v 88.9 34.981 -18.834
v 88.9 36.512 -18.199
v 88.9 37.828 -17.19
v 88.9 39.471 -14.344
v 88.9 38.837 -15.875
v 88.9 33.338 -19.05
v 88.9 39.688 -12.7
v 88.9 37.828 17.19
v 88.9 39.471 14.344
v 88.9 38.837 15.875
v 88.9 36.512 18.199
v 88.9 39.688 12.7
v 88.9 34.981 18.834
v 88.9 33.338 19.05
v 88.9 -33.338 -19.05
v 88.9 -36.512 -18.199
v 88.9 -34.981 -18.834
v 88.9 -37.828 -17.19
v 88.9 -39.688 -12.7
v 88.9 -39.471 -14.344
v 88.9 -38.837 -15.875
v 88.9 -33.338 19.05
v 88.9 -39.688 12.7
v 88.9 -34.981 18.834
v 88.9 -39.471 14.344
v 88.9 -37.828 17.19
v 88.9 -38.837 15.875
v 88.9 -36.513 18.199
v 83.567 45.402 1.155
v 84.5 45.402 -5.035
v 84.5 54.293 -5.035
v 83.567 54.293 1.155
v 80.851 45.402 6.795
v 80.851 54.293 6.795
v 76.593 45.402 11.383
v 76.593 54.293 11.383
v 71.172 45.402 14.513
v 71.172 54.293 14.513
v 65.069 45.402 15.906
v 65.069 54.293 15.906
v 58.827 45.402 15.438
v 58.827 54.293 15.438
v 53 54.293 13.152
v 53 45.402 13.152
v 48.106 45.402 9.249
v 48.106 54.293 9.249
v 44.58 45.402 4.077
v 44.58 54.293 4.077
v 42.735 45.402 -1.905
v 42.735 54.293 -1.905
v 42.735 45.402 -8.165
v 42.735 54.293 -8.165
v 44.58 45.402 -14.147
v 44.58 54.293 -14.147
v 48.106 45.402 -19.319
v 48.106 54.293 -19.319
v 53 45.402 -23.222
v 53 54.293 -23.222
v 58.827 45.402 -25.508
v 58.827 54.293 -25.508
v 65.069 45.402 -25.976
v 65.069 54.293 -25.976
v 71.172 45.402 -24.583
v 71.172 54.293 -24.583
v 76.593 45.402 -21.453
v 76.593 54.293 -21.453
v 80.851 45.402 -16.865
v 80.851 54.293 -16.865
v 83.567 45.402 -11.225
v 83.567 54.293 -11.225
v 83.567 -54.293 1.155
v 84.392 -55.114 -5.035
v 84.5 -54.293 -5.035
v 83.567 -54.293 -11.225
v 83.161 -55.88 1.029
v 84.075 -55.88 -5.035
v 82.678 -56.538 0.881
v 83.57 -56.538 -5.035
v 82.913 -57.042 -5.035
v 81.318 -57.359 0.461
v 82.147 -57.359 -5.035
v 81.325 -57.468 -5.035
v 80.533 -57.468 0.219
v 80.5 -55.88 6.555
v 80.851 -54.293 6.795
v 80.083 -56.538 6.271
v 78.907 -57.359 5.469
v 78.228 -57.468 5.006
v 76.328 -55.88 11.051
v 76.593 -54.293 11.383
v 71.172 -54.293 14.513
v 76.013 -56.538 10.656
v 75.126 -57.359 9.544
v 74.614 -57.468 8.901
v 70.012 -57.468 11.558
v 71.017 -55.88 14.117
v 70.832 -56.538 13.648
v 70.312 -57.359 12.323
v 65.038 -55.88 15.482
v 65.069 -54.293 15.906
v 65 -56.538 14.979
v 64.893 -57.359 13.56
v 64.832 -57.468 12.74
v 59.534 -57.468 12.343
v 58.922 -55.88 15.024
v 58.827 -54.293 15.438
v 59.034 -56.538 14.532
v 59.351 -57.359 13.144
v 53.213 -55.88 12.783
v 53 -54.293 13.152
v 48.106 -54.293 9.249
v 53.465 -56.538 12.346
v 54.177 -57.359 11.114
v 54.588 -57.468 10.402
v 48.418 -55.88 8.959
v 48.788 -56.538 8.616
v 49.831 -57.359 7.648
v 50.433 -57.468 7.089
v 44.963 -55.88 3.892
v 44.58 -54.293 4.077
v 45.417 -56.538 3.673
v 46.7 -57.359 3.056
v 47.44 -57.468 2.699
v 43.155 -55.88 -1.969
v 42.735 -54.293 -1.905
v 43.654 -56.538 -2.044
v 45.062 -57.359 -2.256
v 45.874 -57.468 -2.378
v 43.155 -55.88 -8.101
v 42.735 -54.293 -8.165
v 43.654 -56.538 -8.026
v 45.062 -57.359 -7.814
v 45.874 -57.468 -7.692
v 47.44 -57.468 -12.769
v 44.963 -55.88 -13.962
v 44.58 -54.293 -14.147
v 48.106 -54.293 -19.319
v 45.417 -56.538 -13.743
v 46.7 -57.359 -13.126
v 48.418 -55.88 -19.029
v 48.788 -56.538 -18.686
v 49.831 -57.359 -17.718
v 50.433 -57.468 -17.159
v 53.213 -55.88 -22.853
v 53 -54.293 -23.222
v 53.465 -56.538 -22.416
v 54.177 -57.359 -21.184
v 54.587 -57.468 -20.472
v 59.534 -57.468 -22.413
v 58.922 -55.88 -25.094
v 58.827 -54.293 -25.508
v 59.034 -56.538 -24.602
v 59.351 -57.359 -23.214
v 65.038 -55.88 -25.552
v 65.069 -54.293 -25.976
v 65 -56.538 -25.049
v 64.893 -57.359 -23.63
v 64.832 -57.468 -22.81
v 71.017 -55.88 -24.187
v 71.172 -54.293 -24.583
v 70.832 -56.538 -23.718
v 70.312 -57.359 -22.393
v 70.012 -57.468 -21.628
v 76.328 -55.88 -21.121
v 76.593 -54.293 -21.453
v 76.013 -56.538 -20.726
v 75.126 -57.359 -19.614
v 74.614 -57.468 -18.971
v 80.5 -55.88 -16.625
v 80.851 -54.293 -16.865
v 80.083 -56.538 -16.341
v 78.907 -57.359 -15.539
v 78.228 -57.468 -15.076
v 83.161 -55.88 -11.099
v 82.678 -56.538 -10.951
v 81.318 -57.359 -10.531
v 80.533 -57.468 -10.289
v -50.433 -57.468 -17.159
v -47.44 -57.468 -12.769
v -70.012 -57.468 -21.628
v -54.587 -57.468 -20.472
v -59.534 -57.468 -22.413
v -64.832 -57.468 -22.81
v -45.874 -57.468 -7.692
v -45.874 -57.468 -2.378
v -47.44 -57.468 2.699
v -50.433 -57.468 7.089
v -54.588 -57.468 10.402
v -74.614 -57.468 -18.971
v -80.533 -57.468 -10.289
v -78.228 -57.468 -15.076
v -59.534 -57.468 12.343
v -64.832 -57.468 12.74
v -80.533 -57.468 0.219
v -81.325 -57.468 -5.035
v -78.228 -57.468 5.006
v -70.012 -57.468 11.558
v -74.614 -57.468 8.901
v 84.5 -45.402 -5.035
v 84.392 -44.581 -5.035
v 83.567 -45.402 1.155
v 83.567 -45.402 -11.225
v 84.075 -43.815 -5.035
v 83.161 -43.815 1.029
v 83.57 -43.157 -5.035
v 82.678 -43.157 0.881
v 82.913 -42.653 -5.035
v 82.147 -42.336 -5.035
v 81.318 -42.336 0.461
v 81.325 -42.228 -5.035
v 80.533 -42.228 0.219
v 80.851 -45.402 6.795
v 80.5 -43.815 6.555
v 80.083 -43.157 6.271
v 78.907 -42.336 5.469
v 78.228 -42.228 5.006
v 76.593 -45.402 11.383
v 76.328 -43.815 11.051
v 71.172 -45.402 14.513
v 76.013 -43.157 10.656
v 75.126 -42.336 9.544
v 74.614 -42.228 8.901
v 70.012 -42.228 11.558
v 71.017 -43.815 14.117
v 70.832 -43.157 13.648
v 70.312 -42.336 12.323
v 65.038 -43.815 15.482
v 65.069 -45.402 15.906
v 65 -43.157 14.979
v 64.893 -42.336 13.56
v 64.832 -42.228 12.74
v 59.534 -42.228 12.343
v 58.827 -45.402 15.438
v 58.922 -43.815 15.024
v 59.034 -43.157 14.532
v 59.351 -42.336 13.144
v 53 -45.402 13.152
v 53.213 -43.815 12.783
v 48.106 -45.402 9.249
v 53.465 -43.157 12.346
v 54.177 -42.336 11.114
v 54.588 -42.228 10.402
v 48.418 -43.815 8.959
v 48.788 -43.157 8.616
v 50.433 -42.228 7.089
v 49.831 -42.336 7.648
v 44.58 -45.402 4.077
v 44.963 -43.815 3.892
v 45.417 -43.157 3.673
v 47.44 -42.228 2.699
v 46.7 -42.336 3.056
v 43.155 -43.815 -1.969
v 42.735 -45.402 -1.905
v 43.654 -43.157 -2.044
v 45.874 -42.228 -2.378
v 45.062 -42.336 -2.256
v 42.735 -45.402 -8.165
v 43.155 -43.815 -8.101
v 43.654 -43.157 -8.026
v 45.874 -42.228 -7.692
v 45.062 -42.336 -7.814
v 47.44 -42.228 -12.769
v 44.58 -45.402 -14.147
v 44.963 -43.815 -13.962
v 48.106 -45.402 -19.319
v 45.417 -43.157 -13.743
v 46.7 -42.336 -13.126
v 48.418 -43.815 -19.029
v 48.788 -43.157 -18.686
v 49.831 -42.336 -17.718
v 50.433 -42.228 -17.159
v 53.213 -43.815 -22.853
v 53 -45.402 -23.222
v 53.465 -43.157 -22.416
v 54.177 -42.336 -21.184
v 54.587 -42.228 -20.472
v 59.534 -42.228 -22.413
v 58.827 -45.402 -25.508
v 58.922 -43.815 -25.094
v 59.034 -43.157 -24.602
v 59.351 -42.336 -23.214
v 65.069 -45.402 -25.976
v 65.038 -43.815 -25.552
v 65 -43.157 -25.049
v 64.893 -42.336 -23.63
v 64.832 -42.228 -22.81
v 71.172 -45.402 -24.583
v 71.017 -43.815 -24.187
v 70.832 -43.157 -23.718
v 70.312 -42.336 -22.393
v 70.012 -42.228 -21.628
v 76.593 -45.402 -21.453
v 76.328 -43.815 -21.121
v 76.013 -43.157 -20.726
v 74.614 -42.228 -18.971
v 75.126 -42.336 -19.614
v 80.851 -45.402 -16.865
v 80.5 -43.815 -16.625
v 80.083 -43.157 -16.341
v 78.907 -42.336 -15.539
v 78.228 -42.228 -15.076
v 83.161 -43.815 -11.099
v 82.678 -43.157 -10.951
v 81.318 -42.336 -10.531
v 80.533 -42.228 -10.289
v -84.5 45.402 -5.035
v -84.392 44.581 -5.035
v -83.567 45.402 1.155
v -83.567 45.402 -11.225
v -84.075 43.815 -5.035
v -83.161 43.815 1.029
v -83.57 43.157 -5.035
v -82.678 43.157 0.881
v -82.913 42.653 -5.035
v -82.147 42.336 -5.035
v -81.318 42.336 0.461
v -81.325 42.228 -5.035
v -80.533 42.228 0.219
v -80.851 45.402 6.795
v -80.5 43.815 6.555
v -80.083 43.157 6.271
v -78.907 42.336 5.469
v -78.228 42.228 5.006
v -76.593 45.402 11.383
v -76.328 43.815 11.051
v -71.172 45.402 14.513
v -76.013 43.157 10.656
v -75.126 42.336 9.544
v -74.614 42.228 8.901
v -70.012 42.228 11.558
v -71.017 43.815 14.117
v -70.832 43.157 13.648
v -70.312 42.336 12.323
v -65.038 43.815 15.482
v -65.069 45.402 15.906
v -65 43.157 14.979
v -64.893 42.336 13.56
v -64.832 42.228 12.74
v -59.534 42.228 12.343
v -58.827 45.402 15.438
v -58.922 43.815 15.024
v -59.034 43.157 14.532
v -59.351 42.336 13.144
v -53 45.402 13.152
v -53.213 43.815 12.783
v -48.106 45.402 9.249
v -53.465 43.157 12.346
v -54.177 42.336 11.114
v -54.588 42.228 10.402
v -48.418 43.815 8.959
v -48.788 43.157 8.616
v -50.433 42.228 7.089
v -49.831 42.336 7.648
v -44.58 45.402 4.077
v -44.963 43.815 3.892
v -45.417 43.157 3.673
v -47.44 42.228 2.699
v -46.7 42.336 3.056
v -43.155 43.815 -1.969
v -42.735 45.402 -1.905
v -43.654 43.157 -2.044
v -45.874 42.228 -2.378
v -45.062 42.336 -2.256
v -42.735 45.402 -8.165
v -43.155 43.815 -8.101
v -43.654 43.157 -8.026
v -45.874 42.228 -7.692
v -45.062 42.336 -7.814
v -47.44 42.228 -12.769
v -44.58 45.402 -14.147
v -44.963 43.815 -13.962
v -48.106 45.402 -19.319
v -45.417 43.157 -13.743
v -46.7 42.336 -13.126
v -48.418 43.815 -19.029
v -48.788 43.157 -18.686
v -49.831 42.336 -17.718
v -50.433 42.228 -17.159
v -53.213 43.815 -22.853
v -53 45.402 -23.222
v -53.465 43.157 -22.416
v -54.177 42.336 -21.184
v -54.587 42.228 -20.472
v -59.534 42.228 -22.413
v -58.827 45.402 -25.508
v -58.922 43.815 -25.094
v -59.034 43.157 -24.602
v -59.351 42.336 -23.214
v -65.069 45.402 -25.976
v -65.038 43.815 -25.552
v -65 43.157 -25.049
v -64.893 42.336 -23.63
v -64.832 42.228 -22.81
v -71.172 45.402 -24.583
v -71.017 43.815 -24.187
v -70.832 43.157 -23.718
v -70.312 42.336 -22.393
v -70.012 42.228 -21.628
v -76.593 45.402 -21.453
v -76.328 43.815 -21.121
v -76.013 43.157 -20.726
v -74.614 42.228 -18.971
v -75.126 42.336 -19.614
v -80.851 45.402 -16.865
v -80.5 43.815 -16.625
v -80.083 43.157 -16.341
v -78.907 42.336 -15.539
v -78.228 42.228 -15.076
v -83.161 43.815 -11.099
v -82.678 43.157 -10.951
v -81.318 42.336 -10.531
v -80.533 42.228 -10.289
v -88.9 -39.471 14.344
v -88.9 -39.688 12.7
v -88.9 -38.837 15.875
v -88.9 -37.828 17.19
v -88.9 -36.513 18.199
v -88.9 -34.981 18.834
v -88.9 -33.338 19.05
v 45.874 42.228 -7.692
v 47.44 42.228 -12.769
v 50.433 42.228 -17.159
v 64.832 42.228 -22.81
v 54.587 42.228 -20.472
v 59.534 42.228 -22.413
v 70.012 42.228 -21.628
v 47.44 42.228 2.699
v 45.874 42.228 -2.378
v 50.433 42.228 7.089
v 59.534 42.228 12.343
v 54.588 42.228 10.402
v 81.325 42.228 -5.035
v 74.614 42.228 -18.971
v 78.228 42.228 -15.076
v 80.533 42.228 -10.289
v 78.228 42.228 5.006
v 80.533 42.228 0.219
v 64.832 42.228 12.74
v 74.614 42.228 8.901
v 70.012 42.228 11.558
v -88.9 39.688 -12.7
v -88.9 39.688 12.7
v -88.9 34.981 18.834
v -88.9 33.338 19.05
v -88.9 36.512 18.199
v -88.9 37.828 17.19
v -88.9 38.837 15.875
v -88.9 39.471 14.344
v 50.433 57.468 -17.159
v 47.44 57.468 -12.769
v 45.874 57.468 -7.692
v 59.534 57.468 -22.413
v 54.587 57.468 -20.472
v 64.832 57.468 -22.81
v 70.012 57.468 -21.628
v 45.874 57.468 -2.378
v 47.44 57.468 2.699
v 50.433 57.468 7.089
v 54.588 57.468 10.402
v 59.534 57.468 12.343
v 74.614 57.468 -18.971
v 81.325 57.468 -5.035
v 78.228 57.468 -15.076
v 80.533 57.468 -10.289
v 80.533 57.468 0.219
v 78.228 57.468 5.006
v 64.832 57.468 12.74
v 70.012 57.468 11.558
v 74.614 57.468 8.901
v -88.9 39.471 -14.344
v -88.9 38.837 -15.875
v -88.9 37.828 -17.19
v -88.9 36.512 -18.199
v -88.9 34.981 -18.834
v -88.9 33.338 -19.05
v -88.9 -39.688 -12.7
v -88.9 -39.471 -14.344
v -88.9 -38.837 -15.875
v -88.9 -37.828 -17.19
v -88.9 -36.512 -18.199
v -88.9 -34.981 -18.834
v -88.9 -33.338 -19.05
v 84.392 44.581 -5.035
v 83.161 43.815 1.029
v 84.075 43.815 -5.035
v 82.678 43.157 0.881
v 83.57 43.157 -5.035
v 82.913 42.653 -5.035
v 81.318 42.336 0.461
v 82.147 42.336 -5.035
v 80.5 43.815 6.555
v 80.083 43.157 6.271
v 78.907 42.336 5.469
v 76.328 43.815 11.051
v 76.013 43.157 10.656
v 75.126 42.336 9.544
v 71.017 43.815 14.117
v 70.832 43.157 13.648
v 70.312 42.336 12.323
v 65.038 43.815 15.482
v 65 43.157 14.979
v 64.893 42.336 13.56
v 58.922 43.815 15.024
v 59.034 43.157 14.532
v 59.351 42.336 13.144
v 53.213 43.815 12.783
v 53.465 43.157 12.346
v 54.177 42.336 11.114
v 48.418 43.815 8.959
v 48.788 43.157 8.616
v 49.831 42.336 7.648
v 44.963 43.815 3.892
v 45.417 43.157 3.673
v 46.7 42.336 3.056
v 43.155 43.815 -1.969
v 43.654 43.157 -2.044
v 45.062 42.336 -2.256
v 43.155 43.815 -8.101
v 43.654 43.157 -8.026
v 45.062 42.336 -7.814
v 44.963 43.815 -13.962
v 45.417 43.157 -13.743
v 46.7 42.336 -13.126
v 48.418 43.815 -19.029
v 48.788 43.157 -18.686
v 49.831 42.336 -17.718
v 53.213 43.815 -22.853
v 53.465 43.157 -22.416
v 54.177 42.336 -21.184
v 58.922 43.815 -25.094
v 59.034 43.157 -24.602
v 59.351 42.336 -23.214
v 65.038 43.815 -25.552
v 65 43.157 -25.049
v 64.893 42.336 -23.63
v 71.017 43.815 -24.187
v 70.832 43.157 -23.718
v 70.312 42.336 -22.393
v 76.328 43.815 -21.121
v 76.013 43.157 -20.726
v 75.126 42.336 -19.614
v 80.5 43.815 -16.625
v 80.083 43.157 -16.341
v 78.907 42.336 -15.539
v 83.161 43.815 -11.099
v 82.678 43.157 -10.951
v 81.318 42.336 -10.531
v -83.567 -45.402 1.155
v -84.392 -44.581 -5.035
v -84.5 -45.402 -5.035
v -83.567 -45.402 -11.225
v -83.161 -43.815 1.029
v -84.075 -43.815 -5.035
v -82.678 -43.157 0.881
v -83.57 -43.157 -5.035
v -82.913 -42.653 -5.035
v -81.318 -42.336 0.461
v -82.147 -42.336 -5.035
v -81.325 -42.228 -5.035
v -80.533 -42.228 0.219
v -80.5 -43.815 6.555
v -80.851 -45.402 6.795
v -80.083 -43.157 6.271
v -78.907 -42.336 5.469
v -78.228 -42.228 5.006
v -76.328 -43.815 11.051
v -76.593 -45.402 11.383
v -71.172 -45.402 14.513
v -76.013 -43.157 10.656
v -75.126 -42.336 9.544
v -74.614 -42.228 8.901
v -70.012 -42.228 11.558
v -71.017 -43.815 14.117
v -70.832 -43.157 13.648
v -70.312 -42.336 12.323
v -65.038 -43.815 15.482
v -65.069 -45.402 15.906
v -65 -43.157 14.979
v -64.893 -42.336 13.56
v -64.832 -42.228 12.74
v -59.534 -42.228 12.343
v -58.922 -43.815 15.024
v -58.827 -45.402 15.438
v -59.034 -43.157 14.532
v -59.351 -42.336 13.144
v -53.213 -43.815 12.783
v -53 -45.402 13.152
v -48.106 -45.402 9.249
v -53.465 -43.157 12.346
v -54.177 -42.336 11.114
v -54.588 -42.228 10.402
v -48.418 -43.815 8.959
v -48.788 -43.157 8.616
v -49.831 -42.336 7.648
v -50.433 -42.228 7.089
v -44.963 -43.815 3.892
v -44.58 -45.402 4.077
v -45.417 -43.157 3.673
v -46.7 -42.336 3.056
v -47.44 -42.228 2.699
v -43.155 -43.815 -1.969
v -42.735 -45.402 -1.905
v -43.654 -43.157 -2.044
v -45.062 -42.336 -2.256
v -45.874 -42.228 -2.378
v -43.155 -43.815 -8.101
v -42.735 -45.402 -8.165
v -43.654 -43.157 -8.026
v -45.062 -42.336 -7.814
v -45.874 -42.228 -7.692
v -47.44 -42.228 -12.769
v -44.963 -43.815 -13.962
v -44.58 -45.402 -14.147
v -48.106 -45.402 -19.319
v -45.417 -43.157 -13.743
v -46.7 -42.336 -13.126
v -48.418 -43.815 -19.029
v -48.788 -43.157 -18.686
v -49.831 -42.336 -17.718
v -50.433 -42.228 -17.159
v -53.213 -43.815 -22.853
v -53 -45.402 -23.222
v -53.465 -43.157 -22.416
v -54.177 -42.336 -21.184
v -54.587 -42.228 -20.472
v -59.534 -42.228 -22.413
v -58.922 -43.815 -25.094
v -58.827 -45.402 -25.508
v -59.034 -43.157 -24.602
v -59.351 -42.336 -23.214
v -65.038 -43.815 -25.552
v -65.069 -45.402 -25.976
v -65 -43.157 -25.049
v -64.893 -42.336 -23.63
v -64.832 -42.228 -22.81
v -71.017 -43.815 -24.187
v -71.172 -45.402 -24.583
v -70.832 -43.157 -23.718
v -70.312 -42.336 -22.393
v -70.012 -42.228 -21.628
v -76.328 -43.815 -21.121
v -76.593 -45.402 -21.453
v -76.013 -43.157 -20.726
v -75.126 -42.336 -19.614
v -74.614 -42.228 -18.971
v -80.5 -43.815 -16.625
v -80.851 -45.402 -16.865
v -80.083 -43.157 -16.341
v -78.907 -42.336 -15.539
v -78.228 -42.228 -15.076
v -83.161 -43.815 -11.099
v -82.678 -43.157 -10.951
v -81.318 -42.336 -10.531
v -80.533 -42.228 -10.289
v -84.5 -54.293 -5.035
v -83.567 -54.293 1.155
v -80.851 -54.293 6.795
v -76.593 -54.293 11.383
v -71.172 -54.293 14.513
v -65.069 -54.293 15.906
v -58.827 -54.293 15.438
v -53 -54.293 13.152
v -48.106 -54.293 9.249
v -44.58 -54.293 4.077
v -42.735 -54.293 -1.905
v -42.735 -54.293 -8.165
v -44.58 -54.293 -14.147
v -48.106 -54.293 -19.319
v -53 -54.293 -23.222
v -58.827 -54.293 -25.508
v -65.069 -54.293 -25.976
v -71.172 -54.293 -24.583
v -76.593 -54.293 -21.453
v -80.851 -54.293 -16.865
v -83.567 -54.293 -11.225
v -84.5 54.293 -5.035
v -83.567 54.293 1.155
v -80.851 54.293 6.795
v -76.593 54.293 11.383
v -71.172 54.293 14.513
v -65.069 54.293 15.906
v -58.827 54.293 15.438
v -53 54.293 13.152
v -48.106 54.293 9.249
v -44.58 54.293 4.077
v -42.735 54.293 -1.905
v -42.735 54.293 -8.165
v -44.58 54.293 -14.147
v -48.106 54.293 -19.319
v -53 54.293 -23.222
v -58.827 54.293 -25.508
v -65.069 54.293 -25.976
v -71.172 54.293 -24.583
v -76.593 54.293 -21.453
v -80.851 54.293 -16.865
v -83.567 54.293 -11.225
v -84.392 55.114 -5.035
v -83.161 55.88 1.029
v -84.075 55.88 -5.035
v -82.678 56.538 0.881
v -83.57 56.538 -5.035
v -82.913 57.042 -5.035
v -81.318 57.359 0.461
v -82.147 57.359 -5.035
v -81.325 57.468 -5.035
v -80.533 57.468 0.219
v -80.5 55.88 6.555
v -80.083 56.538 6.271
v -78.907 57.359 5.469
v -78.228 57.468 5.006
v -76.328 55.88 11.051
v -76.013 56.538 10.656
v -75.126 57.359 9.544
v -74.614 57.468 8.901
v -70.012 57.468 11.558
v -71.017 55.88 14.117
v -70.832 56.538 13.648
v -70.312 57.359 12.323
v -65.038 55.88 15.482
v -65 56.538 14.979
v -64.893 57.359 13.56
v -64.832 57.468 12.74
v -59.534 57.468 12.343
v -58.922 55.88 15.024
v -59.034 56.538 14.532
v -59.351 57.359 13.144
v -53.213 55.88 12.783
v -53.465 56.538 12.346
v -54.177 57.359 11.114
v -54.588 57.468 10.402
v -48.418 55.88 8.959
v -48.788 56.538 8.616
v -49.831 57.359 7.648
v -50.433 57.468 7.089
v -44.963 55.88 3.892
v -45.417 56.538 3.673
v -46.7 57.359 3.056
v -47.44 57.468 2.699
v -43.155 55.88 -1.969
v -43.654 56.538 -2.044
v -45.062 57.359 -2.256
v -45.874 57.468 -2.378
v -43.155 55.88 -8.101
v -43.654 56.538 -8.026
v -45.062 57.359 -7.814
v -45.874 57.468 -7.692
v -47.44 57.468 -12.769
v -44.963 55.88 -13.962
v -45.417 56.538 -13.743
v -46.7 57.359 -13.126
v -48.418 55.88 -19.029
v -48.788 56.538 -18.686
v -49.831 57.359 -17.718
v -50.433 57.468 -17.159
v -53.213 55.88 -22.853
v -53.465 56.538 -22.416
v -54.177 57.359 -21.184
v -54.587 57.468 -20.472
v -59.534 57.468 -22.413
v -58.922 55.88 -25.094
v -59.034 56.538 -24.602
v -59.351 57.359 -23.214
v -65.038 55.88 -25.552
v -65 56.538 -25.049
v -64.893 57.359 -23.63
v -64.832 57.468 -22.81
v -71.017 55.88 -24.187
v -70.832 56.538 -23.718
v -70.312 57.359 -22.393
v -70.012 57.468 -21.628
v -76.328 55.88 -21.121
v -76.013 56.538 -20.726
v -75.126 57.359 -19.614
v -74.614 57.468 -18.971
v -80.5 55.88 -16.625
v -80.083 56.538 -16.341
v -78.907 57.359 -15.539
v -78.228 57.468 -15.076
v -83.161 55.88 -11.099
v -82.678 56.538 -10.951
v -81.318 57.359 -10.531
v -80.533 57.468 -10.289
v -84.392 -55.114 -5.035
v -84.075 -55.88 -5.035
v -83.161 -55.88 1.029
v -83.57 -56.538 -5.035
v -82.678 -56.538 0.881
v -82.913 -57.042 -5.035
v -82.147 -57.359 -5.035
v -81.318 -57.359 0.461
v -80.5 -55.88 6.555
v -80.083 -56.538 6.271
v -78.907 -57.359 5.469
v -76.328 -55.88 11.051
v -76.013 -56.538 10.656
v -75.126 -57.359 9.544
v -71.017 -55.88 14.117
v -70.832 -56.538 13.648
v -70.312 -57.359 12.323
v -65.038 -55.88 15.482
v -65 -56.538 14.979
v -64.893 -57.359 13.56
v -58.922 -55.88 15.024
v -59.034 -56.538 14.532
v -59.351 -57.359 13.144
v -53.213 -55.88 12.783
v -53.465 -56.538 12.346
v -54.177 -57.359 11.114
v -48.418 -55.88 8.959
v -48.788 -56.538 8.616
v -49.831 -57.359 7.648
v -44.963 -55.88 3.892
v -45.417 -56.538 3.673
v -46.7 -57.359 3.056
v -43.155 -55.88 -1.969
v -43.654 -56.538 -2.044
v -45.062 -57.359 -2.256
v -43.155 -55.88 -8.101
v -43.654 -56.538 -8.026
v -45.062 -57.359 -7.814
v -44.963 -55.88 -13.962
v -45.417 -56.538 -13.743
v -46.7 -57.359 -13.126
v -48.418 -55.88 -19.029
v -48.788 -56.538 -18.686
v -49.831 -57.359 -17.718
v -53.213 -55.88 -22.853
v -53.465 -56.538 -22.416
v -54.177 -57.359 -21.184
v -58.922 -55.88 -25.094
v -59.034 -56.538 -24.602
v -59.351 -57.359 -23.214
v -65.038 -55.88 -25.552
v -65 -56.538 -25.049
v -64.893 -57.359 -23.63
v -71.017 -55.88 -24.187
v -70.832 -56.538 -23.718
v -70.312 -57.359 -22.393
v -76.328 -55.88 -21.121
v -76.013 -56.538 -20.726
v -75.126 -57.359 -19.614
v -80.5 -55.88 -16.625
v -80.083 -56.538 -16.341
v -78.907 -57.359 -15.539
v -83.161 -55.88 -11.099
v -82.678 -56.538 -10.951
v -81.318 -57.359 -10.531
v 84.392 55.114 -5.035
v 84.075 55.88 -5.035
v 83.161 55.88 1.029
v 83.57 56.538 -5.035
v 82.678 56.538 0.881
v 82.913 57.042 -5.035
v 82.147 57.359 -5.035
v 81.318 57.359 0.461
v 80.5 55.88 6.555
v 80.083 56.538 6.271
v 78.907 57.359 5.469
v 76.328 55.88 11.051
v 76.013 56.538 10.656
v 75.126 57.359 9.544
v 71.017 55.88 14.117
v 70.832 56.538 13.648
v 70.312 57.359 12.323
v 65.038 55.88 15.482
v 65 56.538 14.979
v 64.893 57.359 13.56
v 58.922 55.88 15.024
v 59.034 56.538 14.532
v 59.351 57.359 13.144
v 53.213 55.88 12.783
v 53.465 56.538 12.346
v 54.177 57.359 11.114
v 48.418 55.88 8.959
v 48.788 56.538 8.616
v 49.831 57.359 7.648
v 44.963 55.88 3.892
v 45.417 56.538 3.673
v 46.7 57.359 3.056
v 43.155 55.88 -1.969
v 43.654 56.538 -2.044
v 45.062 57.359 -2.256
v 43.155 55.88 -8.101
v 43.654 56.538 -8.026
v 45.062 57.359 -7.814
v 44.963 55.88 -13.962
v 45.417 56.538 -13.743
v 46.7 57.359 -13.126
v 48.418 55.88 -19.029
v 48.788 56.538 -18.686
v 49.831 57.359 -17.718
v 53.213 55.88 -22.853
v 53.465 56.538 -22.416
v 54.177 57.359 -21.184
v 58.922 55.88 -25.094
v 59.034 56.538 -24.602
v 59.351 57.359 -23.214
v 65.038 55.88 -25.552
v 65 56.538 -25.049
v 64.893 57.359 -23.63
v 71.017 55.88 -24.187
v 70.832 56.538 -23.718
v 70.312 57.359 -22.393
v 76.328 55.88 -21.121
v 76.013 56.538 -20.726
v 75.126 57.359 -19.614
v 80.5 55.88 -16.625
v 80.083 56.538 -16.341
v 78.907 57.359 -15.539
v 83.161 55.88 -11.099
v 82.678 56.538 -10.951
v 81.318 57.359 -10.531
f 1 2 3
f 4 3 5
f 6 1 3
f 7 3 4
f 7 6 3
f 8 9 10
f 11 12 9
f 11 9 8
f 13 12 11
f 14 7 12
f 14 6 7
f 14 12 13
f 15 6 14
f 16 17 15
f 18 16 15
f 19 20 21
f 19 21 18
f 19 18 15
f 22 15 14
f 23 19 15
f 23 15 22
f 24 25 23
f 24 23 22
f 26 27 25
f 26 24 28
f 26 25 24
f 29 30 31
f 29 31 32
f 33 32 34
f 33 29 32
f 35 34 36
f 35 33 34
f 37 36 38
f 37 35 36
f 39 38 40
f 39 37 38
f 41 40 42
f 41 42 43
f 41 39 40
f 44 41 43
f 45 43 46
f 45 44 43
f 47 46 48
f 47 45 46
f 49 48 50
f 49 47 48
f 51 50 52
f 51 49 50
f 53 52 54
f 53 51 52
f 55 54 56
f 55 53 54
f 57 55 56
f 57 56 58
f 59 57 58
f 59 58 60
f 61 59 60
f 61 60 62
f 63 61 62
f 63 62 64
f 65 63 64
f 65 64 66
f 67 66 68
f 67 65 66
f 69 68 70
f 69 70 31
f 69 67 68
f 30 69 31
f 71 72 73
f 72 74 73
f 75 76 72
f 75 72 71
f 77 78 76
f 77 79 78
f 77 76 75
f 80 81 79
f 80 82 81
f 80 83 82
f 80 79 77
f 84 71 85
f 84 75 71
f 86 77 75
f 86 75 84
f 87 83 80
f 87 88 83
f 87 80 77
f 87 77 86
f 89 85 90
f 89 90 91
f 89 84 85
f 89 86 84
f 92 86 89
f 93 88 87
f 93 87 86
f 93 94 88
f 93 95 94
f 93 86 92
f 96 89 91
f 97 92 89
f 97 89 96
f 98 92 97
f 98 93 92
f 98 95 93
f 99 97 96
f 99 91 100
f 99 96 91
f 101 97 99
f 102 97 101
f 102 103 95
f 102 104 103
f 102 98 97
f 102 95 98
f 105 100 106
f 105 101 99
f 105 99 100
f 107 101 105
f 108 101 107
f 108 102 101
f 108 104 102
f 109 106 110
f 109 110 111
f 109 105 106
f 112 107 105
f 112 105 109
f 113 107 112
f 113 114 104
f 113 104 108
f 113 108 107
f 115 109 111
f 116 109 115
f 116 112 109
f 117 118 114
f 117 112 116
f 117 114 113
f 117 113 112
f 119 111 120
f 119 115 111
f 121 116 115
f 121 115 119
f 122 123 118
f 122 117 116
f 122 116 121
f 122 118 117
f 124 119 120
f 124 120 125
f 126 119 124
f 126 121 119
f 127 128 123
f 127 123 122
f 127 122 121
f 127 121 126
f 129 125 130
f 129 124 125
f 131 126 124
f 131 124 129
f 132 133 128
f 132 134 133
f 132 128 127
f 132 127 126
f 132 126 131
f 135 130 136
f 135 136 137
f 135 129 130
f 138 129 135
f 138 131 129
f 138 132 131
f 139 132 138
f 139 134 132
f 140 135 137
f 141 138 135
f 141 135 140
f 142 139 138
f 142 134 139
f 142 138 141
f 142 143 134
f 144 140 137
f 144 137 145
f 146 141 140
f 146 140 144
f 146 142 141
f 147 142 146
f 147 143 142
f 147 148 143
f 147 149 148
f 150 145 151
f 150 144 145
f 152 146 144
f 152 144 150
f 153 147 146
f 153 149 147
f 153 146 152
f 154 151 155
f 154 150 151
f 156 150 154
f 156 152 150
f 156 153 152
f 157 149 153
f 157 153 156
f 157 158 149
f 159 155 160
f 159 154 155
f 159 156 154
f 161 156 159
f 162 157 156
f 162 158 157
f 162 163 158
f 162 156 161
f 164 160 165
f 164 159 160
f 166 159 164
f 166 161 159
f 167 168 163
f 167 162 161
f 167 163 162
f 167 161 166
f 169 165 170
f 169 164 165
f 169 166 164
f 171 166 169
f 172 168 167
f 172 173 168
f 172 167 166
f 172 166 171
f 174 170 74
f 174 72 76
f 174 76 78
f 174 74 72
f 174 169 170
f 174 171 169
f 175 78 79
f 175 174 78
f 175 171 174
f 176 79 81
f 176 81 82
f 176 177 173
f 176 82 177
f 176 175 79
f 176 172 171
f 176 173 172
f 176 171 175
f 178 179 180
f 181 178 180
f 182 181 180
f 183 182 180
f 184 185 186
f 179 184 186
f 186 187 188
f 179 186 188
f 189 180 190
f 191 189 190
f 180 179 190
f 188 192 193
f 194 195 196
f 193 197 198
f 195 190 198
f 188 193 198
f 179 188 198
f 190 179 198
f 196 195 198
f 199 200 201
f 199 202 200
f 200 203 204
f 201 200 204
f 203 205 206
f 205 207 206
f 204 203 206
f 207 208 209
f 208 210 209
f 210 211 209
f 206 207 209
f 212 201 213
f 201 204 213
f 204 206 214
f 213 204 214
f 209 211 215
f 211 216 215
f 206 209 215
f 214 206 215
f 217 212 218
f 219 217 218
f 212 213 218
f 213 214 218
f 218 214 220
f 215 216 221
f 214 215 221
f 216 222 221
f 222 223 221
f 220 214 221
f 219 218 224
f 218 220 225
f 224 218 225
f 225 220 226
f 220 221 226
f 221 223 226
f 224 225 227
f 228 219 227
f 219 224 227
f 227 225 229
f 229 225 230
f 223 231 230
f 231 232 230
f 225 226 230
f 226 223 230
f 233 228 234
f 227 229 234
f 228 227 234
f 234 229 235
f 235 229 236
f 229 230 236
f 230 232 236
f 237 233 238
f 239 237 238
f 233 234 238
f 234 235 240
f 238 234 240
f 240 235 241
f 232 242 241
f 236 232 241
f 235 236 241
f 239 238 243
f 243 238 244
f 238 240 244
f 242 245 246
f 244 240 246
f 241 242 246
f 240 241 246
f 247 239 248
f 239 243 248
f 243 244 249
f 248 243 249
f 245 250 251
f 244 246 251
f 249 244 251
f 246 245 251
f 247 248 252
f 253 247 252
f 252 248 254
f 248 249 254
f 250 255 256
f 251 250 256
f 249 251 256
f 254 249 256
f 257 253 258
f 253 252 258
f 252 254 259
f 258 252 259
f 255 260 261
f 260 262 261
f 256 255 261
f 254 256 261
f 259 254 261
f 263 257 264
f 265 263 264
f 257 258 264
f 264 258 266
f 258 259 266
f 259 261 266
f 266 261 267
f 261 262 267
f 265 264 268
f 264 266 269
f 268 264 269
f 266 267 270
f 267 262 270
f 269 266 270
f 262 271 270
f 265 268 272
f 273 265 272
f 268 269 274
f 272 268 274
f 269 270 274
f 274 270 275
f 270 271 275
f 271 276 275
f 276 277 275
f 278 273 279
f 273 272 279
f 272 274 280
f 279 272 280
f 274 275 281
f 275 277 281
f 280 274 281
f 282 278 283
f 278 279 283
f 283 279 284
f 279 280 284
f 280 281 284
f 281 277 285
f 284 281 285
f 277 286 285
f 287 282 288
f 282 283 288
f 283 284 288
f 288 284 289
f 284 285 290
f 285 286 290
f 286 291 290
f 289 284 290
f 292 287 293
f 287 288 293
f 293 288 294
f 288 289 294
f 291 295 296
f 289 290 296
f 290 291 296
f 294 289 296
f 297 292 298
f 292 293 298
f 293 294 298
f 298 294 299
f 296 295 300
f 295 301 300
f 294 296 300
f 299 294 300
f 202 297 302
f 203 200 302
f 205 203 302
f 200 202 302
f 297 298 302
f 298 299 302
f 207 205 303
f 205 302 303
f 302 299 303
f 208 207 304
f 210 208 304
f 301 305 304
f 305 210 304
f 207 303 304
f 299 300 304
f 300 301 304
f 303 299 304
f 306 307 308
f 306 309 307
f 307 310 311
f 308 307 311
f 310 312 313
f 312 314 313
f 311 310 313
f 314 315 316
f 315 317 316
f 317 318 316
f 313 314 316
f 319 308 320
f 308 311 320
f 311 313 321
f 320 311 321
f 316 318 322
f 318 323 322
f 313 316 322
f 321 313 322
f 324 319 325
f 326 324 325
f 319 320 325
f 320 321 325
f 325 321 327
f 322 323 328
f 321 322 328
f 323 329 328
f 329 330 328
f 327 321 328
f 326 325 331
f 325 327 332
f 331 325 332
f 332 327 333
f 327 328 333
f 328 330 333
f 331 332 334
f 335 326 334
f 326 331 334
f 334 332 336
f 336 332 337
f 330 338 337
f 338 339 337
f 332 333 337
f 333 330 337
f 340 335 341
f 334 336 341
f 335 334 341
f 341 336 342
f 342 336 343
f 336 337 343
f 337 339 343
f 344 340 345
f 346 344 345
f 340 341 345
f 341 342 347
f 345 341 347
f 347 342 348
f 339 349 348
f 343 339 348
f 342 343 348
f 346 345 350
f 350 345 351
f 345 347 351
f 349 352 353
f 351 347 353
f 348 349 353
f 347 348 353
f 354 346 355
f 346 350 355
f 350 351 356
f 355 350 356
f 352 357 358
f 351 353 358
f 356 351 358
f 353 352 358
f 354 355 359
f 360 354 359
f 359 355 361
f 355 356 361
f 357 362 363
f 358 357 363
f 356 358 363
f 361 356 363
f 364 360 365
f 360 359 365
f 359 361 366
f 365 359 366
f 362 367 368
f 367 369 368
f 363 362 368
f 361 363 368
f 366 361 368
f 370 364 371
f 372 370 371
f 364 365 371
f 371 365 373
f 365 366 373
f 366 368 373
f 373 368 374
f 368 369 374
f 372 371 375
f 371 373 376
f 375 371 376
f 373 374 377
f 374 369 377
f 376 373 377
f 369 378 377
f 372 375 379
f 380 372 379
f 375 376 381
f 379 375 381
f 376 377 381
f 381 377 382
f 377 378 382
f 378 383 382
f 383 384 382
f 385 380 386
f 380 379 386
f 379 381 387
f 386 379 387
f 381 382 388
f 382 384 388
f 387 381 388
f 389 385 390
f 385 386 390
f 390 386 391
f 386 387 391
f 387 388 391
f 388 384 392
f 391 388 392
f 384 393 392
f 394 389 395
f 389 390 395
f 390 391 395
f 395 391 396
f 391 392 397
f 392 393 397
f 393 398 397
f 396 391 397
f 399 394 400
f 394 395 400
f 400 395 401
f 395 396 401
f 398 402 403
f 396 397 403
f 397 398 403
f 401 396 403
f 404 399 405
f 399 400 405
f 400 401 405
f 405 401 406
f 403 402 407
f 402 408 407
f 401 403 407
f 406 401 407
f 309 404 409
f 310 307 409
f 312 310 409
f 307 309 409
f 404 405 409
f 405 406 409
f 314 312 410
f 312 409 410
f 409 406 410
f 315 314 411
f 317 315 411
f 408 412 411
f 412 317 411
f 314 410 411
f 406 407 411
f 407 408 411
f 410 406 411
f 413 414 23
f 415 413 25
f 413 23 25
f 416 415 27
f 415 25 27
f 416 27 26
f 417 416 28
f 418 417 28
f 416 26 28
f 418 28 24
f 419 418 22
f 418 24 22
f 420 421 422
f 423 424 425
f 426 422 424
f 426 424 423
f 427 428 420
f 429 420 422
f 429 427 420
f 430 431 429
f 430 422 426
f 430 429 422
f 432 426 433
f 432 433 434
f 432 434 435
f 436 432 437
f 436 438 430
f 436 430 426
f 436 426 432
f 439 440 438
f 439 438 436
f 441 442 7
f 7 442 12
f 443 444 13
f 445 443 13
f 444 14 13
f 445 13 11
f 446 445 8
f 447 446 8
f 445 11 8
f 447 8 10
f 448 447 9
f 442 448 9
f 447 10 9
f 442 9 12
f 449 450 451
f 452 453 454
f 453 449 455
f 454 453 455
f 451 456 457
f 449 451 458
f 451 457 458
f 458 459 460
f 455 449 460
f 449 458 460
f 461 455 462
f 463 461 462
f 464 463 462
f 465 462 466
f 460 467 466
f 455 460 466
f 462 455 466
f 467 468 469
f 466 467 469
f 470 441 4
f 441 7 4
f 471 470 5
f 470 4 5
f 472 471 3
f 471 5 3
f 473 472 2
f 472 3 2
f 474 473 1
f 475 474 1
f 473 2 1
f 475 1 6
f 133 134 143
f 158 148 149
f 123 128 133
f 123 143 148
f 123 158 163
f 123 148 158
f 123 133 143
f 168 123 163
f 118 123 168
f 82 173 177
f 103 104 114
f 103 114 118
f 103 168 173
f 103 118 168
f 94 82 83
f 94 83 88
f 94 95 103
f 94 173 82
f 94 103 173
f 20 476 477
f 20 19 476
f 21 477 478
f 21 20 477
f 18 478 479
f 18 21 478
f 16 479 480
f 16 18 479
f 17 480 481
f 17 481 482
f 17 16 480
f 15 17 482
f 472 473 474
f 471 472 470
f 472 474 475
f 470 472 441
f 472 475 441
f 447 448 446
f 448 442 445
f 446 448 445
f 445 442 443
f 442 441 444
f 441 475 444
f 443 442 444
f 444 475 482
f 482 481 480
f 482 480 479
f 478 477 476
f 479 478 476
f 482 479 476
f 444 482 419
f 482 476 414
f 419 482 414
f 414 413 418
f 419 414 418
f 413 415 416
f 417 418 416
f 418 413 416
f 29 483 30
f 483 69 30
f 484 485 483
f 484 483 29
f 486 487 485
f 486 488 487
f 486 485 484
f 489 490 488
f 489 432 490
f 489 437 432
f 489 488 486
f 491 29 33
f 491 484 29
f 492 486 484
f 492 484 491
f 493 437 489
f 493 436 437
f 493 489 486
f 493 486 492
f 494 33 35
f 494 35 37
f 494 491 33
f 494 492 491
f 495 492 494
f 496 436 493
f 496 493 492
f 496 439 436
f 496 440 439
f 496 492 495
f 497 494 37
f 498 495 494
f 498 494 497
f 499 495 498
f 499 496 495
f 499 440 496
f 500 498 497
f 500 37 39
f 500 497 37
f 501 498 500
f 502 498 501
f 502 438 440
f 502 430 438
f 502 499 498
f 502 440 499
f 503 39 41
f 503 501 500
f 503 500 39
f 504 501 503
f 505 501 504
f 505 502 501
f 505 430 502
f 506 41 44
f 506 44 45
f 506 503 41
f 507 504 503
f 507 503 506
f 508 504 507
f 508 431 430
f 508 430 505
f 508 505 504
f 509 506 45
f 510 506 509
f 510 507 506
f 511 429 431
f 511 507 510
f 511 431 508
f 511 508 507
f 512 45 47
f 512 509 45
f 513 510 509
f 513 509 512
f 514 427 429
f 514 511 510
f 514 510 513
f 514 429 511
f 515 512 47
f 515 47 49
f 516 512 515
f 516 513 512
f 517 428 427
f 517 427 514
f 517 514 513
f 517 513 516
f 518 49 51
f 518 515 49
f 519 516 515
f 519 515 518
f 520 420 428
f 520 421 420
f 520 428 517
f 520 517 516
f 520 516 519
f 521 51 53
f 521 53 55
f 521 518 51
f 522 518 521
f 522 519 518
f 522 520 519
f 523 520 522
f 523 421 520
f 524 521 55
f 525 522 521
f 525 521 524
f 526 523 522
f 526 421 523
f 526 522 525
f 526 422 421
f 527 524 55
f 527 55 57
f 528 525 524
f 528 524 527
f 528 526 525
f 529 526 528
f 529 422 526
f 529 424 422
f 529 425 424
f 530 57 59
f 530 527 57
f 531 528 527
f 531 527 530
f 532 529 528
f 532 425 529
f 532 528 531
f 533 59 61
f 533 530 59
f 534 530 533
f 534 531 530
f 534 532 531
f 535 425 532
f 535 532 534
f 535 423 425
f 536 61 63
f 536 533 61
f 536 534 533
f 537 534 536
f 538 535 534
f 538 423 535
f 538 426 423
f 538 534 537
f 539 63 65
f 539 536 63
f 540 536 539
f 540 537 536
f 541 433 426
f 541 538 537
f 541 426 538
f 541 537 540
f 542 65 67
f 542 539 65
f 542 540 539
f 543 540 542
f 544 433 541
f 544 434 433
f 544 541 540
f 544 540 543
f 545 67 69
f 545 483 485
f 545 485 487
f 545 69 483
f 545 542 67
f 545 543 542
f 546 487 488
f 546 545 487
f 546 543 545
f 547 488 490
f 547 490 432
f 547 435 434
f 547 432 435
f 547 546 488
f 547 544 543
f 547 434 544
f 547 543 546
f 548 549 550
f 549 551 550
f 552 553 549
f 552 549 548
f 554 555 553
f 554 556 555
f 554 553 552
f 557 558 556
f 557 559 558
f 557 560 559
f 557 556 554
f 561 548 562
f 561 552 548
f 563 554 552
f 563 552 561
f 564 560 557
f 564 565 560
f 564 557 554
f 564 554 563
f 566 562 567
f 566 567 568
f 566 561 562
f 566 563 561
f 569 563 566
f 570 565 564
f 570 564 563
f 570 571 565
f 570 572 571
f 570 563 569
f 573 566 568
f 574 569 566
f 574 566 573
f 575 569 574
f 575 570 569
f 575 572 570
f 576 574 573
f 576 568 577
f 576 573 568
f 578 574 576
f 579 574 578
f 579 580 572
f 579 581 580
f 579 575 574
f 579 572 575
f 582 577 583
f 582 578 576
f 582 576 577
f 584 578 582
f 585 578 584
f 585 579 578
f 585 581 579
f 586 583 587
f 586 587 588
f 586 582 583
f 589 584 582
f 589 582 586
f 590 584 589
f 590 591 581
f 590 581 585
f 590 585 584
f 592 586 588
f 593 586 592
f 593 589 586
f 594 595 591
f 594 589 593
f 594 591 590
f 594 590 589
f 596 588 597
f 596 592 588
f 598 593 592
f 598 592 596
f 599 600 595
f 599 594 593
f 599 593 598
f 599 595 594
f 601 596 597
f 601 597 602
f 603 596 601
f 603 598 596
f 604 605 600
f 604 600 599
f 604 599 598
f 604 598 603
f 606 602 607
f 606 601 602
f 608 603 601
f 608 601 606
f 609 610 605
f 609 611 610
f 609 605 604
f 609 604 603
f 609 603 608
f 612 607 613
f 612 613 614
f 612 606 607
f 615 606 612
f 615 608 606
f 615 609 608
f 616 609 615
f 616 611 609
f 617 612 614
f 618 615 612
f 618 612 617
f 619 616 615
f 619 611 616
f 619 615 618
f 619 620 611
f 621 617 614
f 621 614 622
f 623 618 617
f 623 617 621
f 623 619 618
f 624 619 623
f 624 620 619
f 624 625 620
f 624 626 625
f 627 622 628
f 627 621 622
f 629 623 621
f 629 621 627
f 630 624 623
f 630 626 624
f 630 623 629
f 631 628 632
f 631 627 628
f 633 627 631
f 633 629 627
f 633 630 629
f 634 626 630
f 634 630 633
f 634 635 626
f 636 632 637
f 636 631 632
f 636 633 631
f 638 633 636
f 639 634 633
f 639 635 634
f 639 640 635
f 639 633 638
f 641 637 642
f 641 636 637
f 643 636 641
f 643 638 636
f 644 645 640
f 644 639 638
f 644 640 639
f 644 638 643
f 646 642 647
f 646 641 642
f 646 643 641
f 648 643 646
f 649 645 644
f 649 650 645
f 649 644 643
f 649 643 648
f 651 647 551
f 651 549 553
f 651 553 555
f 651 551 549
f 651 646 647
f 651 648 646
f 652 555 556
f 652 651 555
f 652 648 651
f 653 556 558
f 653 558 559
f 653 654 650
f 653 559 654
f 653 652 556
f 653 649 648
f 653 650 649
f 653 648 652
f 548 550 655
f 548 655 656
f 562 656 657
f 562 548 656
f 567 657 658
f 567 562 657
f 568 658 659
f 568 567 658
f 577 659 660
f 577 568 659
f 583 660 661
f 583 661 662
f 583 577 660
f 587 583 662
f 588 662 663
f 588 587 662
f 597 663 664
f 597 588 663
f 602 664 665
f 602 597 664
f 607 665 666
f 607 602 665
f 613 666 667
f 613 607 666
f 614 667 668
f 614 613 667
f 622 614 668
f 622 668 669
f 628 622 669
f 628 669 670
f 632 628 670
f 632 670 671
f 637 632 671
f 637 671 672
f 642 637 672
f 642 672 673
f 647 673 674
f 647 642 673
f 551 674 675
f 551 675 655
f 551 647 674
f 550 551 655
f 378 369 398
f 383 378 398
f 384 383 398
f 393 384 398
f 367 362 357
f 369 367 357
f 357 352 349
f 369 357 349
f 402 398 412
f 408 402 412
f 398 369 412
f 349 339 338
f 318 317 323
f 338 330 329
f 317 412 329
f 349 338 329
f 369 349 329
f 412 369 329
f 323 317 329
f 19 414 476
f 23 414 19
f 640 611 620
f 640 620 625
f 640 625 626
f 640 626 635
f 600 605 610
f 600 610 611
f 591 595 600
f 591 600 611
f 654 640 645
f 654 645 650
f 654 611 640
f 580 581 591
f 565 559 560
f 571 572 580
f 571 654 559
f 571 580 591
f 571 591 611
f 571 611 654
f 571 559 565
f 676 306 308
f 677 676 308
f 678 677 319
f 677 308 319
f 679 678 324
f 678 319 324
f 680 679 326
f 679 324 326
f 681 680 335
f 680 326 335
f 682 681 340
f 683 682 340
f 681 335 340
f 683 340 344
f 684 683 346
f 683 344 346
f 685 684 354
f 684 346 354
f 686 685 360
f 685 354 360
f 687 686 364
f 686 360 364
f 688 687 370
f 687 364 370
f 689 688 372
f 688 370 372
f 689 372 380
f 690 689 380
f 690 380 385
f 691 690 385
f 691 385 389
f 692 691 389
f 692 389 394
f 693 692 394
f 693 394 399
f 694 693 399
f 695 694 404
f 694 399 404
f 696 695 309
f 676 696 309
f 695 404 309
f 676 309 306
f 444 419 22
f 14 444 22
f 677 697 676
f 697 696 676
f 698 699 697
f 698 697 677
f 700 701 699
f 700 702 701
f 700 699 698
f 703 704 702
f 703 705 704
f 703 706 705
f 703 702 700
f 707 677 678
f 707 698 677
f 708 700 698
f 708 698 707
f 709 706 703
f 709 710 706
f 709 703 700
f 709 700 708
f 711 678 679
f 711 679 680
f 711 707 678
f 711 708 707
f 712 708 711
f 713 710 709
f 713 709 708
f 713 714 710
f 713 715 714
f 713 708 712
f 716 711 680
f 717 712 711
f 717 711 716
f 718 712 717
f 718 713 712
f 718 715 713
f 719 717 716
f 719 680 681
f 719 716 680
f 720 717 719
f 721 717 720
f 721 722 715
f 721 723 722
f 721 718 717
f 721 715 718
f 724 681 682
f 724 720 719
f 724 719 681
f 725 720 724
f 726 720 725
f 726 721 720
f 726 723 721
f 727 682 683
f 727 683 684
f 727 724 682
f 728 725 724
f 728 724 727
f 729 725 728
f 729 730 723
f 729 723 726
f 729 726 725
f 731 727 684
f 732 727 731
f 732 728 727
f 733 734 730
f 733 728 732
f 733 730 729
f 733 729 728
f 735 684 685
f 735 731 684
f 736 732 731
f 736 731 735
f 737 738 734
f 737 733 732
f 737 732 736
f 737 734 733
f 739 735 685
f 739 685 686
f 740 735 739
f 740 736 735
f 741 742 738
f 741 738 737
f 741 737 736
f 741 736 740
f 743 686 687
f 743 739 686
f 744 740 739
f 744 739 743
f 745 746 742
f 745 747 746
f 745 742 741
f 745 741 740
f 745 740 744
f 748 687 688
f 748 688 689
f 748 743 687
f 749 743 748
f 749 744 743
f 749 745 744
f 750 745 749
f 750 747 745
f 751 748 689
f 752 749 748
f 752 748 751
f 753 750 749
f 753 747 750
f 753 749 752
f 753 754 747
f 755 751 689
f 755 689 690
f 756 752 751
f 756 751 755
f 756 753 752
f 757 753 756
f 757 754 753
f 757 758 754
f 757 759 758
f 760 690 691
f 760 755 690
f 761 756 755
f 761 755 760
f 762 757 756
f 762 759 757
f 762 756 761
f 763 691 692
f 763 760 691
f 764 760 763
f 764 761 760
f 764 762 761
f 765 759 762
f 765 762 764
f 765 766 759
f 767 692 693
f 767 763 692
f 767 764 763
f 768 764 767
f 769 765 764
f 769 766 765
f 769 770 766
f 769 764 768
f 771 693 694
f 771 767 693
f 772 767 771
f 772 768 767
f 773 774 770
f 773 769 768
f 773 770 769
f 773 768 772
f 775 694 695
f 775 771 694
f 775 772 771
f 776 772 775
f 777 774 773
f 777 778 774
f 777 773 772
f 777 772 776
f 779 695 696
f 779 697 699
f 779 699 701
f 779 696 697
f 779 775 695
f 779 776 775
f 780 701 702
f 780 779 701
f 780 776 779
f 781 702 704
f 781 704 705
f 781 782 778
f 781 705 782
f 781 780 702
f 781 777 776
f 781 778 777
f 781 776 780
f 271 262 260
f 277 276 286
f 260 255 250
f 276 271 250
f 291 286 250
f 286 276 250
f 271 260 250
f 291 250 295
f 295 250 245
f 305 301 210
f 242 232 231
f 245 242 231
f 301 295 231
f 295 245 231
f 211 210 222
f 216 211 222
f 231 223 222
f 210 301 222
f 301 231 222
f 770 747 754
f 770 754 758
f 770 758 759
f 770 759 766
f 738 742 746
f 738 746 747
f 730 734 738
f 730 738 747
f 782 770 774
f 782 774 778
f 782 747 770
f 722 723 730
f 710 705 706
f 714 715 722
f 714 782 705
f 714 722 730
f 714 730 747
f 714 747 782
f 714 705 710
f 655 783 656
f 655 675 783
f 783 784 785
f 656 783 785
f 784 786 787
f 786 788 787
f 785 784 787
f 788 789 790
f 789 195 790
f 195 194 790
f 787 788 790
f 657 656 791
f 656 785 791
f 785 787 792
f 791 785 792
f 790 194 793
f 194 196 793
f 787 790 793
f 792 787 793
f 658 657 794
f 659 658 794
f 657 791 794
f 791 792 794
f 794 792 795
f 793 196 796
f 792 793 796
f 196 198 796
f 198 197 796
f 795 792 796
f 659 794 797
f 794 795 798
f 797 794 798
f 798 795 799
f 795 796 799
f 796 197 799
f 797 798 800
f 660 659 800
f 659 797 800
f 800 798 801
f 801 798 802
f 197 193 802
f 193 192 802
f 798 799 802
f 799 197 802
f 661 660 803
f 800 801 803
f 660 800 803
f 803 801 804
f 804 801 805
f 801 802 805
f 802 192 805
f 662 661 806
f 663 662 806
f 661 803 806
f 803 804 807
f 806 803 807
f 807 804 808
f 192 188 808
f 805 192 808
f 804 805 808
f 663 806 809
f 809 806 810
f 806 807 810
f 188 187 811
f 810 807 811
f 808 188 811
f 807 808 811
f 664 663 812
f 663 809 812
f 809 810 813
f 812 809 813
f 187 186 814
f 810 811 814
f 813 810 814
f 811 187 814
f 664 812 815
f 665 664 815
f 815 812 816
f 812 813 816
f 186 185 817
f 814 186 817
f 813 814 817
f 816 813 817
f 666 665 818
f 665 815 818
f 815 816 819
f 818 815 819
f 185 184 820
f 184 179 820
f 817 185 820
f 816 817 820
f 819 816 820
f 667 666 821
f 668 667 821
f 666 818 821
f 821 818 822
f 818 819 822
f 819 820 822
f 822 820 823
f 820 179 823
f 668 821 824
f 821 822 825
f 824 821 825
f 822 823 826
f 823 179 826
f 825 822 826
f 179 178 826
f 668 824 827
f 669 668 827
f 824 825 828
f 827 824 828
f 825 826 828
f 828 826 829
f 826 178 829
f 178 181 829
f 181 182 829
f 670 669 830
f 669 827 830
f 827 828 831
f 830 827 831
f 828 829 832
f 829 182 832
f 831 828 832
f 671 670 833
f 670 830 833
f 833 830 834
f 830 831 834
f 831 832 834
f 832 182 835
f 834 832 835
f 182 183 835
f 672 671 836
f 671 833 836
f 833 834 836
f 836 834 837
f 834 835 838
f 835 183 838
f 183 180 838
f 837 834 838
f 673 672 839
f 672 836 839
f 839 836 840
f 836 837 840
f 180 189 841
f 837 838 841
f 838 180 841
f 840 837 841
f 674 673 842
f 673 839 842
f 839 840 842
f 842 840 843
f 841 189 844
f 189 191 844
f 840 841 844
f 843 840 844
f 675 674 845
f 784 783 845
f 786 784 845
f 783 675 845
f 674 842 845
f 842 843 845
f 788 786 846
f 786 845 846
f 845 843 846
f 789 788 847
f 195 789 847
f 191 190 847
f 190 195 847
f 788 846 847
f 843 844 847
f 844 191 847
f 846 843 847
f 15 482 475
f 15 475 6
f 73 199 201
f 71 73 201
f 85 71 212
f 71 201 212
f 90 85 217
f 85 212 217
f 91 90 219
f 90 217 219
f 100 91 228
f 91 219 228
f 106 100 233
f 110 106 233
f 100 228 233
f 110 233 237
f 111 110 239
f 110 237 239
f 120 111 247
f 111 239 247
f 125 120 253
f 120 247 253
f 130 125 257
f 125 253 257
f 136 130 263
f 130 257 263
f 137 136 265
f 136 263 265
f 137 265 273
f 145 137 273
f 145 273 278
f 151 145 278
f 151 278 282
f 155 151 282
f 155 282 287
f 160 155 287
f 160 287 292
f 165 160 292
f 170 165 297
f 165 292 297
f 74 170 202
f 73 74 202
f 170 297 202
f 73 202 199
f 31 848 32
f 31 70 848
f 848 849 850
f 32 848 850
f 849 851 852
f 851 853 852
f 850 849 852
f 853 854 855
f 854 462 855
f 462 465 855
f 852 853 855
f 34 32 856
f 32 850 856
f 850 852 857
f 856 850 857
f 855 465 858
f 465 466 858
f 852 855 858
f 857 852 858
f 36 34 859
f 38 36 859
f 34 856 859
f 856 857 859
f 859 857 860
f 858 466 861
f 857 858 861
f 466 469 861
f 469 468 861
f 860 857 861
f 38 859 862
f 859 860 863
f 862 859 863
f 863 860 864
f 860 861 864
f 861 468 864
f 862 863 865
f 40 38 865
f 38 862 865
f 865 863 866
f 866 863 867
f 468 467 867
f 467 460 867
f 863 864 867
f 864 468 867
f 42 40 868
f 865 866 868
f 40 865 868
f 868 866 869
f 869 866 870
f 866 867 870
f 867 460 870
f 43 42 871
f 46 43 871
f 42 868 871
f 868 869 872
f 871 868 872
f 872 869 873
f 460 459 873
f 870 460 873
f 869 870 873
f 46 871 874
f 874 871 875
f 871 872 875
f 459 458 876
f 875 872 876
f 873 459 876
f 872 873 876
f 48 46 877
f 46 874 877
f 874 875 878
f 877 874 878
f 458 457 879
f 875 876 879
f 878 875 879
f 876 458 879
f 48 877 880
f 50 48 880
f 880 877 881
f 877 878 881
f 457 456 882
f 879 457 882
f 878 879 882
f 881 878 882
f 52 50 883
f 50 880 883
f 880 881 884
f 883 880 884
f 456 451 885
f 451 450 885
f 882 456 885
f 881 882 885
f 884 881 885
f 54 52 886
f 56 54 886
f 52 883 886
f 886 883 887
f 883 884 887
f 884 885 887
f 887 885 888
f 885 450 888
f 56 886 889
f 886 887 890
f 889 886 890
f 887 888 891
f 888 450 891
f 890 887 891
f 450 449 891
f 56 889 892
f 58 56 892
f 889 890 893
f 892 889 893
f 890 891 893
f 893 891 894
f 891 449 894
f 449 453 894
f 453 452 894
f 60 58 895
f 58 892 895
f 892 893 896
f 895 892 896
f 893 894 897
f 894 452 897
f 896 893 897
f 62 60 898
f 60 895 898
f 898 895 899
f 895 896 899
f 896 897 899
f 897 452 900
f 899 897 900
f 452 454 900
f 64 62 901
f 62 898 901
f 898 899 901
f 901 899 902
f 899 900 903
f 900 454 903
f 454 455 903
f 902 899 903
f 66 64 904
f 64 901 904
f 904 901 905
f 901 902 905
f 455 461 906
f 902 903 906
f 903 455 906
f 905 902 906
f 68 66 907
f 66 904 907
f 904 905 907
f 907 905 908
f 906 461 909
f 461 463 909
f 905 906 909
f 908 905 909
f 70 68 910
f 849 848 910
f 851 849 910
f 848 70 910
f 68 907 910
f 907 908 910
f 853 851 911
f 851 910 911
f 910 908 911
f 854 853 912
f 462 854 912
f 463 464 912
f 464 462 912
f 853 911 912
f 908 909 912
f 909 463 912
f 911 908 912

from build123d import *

# Parameters (mm, degrees)
F1_W     = 177.8
F1_H     = 38.1
F2_DEPTH = 39.6875
F4_R     = 21
F5_DEPTH = 15.24
F6_R     = 6.35
F7_R     = 3.175
F8_R     = 3.175
F10_R    = 6.35
F11_R    = 6.35


with BuildPart() as f2:
    # F1 (on Front) → F2 (new body, symmetric)
    with BuildSketch(Plane.XZ):
        Rectangle(F1_W, F1_H)
    extrude(amount=F2_DEPTH, both=True)

    # F6
    f6_edges = [f2.edges().sort_by_distance(p)[0] for p in [
        (0, -39.6875, 19.05),
    ]]
    fillet(f6_edges, radius=F6_R)

    # F10
    f10_edges = [f2.edges().sort_by_distance(p)[0] for p in [
        (0, -39.6875, -19.05),
        (0, 39.6875, 19.05),
    ]]
    fillet(f10_edges, radius=F10_R)

    # F11
    f11_edges = [f2.edges().sort_by_distance(p)[0] for p in [
        (0, 39.6875, -19.05),
    ]]
    fillet(f11_edges, radius=F11_R)


with BuildPart() as f5:
    # F4 (on offset) → F5 (new body)
    with BuildSketch(Plane.XZ.offset(42.2275)):
        with Locations((63.5, -5.035)):
            Circle(F4_R)
    extrude(amount=F5_DEPTH)

    # F7
    f7_edges = [f5.edges().sort_by_distance(p)[0] for p in [
        (42.5, -57.4675, -5.035),
    ]]
    fillet(f7_edges, radius=F7_R)

    # F8
    f8_edges = [f5.edges().sort_by_distance(p)[0] for p in [
        (42.5, -42.2275, -5.035),
    ]]
    fillet(f8_edges, radius=F8_R)


with BuildPart() as f9_1:
    # F9: instance of F5
    add(f5.part.mirror(Plane.XZ))


with BuildPart() as f12_1:
    # F12: instance of F5
    add(f5.part.mirror(Plane.YZ))


with BuildPart() as f12_2:
    # F12: instance of F9_1
    add(f9_1.part.mirror(Plane.YZ))


solid = Compound([f2.part, f5.part, f9_1.part, f12_1.part, f12_2.part])
